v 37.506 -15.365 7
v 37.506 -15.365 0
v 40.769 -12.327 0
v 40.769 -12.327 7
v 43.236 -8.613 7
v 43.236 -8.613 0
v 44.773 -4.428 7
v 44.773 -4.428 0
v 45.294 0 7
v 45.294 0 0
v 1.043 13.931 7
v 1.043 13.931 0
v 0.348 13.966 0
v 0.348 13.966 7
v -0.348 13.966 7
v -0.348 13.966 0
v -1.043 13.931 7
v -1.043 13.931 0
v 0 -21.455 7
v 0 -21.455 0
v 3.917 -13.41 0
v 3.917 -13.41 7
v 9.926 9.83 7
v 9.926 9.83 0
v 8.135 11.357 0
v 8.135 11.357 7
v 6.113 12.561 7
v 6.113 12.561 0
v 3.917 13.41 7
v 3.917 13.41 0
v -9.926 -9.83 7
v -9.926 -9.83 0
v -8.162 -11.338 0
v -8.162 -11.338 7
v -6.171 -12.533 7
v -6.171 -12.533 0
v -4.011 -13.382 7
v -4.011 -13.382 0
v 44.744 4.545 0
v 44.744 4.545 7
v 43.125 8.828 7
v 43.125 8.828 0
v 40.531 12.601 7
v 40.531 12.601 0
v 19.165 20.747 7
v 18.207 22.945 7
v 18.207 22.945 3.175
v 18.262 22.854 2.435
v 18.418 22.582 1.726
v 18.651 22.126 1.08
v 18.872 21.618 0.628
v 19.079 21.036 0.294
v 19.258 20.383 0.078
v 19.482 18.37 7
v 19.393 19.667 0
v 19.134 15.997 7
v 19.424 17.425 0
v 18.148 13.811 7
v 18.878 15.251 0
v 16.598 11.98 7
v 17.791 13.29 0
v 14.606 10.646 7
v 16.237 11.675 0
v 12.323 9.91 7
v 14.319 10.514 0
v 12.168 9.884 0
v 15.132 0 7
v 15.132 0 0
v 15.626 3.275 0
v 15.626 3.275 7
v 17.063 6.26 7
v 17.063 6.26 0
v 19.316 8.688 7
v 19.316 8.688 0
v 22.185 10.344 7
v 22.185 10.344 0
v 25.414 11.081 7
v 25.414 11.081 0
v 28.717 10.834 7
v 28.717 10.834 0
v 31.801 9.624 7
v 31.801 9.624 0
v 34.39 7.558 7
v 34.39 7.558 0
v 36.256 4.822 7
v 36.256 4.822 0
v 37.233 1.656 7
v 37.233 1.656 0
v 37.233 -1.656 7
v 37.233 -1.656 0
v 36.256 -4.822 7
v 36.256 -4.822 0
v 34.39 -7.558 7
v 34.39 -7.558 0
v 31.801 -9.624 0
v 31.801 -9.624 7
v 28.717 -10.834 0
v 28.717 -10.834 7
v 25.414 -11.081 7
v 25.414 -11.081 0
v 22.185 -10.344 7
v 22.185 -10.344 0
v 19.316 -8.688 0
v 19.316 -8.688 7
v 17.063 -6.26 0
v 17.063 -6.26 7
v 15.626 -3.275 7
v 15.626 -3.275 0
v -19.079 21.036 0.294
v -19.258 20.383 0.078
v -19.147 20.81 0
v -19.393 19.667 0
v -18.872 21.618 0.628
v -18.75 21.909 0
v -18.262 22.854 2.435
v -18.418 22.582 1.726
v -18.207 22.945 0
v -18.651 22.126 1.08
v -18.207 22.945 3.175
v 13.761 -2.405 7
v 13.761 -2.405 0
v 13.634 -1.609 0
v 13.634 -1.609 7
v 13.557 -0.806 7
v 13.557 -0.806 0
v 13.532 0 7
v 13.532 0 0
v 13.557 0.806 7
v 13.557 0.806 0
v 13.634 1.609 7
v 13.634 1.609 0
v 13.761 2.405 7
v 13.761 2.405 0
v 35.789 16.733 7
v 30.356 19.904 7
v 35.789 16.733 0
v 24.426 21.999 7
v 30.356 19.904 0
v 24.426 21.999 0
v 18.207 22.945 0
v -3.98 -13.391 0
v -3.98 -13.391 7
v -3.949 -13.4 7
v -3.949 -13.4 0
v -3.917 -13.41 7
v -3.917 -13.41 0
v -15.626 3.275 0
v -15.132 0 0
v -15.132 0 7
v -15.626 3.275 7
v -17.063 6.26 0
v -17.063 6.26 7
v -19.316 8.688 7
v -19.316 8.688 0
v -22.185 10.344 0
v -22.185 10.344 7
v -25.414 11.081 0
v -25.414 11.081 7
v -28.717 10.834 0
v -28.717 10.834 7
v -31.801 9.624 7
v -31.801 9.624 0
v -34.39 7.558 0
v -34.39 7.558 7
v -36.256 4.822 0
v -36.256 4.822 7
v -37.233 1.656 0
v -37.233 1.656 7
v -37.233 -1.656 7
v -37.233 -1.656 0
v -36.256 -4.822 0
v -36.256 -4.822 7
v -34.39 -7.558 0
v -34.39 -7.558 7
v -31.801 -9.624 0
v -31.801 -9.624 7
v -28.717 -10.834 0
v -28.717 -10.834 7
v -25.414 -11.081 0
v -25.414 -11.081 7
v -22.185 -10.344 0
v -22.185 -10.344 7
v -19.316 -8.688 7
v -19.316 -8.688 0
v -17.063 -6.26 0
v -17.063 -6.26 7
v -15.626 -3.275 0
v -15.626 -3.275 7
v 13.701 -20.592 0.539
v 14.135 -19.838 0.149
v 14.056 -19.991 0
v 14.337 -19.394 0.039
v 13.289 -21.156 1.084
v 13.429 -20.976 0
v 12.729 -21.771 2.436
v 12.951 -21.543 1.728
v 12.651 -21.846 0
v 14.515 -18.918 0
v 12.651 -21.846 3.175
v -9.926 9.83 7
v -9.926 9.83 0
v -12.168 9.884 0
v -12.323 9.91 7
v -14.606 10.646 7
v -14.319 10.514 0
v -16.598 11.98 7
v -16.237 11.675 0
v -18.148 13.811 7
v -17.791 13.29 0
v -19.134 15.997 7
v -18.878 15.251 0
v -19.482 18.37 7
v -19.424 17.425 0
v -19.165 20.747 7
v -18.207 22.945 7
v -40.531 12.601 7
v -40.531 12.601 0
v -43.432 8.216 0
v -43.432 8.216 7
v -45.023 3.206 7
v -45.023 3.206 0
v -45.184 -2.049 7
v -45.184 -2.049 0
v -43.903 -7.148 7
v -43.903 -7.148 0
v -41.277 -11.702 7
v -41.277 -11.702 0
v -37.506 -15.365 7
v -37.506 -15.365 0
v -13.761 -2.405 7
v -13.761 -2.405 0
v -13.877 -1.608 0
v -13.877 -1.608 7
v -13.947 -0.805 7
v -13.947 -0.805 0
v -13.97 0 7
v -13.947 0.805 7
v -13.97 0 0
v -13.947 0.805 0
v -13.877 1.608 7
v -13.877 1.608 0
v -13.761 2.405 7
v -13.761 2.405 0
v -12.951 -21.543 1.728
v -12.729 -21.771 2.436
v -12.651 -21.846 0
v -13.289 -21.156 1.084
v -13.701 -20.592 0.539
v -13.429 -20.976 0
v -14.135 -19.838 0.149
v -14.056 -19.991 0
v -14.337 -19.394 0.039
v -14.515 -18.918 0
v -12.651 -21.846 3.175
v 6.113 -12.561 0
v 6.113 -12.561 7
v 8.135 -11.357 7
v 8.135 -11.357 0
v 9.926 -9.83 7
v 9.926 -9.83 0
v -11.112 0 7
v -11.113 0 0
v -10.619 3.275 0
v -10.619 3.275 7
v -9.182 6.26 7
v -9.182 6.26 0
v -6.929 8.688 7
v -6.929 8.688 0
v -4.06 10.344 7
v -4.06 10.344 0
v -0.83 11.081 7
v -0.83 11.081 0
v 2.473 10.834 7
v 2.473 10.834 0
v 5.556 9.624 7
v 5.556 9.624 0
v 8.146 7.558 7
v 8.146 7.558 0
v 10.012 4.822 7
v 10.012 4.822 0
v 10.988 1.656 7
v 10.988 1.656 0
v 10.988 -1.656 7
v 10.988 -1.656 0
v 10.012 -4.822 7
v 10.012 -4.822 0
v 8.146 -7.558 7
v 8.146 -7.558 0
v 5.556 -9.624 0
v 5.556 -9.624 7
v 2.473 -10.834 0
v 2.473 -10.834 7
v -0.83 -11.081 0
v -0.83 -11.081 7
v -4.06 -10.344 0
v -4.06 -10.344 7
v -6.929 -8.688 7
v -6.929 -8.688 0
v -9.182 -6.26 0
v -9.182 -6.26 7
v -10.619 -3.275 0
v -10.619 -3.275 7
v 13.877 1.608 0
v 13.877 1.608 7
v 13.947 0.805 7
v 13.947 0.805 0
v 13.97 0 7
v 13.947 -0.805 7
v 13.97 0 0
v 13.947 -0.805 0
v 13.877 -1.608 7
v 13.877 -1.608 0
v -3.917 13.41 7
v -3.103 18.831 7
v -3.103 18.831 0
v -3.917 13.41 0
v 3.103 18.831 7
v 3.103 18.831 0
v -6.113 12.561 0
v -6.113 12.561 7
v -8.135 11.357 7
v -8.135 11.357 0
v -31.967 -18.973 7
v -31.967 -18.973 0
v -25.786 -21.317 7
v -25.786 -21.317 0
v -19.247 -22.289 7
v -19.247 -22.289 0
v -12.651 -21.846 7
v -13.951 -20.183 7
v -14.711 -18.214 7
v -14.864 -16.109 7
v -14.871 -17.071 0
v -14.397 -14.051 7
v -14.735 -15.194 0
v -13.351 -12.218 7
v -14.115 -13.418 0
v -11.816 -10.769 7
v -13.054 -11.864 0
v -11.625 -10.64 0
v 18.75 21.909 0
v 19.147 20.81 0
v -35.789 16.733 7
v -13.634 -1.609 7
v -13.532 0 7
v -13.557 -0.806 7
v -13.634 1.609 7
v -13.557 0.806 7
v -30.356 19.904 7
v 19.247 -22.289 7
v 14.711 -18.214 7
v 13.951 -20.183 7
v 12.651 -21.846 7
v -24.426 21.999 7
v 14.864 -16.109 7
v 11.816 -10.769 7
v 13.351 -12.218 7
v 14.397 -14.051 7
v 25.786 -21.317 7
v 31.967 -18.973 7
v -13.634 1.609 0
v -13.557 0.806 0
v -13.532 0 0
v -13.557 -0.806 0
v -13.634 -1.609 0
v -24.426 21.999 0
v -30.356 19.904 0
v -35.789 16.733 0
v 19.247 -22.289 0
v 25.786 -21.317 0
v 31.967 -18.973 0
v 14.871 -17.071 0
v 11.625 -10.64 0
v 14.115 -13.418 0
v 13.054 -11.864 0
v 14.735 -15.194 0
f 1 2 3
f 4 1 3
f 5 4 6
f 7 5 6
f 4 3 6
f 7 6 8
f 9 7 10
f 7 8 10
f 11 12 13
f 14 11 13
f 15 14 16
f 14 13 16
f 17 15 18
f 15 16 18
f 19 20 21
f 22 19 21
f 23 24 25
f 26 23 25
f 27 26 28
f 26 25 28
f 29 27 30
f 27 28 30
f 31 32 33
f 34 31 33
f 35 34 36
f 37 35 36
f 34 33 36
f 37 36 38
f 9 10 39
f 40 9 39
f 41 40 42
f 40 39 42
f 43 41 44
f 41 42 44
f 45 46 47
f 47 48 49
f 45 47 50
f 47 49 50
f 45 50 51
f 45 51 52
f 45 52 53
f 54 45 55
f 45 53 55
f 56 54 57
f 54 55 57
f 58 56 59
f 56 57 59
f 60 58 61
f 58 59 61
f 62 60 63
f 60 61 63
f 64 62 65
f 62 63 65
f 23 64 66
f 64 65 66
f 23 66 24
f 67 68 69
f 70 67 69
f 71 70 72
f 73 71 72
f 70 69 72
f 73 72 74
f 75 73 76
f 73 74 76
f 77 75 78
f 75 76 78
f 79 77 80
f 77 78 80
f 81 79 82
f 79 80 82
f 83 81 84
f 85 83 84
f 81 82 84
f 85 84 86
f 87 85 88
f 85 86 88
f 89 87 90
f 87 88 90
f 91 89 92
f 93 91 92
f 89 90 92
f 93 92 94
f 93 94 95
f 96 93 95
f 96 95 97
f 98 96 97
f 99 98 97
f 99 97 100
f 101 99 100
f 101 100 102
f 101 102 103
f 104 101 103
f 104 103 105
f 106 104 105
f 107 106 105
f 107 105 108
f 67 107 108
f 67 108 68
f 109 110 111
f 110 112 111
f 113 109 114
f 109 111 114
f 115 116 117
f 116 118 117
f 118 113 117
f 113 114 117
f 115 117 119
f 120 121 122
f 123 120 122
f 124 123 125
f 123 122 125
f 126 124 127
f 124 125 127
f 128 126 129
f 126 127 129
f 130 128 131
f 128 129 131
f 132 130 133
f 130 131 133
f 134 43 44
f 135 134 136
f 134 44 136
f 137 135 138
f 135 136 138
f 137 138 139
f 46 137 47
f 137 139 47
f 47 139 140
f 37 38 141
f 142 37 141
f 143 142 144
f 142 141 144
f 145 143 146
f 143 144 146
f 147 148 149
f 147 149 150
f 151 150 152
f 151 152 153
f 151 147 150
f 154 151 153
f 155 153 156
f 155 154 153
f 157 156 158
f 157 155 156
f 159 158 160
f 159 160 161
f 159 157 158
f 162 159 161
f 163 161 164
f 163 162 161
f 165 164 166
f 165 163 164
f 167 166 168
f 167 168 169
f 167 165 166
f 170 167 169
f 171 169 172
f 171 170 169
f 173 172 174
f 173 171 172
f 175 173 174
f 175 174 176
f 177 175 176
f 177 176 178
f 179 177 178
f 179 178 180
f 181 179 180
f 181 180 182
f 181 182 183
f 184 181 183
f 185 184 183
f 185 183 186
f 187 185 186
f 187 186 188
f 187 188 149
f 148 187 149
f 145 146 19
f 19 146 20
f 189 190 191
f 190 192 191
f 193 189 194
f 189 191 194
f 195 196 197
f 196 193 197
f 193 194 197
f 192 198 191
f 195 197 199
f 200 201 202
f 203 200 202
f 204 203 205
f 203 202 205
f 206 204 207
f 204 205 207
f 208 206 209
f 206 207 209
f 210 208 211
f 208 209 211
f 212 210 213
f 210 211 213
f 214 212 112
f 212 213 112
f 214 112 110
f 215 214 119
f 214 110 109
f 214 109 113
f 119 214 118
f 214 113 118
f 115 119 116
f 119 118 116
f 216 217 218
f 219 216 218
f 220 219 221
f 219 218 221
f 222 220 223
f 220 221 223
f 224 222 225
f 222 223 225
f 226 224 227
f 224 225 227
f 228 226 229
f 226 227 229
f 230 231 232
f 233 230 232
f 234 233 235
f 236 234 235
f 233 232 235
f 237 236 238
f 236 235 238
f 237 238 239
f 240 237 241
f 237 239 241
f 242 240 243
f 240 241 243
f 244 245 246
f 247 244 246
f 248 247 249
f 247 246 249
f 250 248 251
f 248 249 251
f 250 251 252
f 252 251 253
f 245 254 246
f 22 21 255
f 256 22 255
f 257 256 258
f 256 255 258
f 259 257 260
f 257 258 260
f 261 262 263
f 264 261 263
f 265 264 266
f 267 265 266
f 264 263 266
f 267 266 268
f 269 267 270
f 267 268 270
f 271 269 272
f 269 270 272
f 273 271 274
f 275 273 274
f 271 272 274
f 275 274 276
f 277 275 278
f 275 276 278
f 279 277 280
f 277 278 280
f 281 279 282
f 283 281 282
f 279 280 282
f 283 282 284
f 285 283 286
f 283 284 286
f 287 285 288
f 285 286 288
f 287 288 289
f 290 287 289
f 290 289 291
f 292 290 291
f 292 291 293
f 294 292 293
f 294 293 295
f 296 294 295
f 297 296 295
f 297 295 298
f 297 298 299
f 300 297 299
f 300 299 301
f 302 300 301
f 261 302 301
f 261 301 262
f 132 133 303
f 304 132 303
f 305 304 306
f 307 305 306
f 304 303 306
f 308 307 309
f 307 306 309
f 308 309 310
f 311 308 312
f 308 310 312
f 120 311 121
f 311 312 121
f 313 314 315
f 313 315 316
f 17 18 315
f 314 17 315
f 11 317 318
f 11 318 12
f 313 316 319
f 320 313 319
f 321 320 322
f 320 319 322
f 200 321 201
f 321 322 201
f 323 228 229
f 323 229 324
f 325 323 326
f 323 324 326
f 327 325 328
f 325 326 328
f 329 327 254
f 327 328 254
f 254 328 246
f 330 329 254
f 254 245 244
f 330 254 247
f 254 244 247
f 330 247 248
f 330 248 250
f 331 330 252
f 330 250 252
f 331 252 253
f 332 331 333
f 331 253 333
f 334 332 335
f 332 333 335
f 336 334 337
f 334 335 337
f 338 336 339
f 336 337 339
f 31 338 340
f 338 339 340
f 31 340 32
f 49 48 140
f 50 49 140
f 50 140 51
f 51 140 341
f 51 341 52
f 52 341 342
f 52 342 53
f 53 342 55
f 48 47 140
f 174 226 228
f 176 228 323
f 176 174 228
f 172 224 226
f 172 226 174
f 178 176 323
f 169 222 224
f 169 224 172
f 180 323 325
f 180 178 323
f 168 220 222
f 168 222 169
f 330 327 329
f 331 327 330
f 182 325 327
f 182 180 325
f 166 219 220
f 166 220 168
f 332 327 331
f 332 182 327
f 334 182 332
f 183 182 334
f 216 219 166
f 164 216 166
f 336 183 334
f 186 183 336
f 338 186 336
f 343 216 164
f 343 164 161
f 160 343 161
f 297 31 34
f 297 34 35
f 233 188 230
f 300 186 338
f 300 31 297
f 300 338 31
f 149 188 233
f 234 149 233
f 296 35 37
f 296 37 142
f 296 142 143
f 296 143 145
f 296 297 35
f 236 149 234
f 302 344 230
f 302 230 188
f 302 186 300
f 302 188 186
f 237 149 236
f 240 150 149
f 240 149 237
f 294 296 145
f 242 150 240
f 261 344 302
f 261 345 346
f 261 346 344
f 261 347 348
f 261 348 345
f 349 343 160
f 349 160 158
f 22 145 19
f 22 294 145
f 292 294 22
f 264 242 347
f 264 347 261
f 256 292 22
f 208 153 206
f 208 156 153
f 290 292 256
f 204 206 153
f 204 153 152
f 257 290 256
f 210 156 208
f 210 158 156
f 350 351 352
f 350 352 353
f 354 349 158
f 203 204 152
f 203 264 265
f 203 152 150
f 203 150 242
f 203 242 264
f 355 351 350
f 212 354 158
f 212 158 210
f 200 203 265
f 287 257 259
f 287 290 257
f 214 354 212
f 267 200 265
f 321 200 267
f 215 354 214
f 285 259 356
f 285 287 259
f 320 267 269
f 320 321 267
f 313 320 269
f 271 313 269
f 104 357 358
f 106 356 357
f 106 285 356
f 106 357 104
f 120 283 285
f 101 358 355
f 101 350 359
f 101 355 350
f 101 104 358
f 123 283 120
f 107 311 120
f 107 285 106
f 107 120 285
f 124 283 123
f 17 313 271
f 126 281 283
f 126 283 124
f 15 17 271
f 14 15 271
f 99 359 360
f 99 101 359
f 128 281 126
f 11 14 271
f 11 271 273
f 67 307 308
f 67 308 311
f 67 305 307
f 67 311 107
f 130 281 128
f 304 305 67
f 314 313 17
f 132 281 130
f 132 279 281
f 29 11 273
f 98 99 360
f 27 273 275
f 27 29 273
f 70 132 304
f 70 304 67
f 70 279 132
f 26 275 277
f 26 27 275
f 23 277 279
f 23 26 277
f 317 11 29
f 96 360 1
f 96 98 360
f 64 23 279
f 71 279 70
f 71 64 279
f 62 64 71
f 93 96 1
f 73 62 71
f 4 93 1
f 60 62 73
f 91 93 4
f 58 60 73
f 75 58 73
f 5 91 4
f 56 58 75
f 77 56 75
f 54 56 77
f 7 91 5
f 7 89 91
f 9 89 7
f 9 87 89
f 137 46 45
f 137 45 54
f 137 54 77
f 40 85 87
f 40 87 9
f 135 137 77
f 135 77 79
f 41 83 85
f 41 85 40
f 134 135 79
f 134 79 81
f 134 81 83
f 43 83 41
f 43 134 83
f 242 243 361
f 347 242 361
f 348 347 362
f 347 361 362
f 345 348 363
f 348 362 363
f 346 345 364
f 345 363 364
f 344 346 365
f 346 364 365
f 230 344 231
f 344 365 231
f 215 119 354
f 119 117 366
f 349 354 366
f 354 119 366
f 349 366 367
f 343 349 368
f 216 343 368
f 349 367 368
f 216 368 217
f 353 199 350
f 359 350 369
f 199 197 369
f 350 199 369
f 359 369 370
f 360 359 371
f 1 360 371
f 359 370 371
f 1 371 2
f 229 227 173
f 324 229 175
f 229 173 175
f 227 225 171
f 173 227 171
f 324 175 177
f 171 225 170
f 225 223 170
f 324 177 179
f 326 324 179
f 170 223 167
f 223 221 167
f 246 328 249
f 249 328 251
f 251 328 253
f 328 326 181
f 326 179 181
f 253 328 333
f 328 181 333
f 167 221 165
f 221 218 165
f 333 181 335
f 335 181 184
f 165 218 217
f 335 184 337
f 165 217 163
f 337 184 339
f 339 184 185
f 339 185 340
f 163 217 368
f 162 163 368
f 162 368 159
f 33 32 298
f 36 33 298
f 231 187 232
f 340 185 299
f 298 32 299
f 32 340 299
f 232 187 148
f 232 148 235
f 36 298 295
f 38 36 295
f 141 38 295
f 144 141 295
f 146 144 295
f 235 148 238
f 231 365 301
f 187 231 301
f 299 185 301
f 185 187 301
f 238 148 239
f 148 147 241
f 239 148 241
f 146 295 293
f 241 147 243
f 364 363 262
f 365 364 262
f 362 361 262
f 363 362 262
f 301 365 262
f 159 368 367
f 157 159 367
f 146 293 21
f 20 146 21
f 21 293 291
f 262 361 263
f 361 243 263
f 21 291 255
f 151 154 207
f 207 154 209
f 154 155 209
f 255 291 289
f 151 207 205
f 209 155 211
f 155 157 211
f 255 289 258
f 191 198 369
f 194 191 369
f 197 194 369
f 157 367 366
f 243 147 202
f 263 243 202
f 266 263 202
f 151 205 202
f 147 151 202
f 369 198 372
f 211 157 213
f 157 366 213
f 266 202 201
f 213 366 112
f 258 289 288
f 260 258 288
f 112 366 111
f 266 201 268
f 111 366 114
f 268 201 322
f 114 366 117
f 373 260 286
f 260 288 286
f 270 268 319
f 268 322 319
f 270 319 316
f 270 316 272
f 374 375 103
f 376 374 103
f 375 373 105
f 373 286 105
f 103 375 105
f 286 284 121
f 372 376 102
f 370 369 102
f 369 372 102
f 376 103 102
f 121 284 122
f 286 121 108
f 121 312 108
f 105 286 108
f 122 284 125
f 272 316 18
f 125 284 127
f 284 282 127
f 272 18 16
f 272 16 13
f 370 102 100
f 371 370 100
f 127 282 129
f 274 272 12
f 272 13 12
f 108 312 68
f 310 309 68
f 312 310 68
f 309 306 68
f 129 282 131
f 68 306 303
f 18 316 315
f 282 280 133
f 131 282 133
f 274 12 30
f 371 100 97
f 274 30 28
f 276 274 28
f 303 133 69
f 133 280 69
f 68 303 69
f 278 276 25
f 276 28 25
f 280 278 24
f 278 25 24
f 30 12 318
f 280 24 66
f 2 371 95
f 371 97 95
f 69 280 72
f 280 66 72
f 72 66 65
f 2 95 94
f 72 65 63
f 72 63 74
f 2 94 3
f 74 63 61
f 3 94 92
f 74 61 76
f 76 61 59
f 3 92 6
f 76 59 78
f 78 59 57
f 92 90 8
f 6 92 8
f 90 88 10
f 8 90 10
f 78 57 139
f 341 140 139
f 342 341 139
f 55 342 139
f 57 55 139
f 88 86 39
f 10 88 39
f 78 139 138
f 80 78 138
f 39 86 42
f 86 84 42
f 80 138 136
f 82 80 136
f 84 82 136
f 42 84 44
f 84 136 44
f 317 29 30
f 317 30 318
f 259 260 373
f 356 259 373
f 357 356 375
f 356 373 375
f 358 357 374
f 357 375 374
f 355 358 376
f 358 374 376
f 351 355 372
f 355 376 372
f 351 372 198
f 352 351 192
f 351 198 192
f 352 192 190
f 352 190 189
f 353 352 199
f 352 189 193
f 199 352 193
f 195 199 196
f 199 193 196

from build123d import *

# Parameters (mm, degrees)
F0_R     = 11.1125
F1_DEPTH = 6.35
F2_R     = 3.17499
F3_DEPTH = 7


# Not quite as in the source:
# - a fillet or chamfer is up to 0.001 mm smaller than in the source, because OpenCascade refuses the exact size


with BuildPart() as f1:
    # F0 (on Top) → F1 (new body)
    with BuildSketch(Plane.XY):
        with BuildLine():
            ThreePointArc((-9.9264482926, -9.8298791597), (-7.1913775024, -11.9768522417), (-4.010805007, -13.3818662075))
            ThreePointArc((-4.010805007, -13.3818662075), (-3.9641218469, -13.3957694062), (-3.9173904939, -13.4095097494))
            ThreePointArc((-3.9173904939, -13.4095097494), (0, -13.97), (3.9173904939, -13.4095097494))
            ThreePointArc((3.9173904939, -13.4095097494), (7.1495738947, -12.001853737), (9.9264482926, -9.8298791597))
            ThreePointArc((9.9264482926, -9.8298791597), (12.4120380065, -6.4111007266), (13.7613551332, -2.4054115859))
            ThreePointArc((13.7613551332, -2.4054115859), (13.5892538356, -1.2081742794), (13.5317131076, 0))
            Line((13.5317131076, 0), (11.1125, 0))
            ThreePointArc((11.1125, 0), (0, -11.1125), (-11.1125, 0))
            Line((-11.1125, 0), (-13.5317149703, 0))
            ThreePointArc((-13.5317149703, 0), (-13.589255453, -1.2081717101), (-13.7613560192, -2.4054065173))
            ThreePointArc((-13.7613560192, -2.4054065173), (-12.4120391871, -6.4110984408), (-9.9264482926, -9.8298791597))
        make_face()
        with BuildLine():
            ThreePointArc((3.9173904939, -13.4095097494), (0, -13.97), (-3.9173904939, -13.4095097494))
            Line((-3.9173904939, -13.4095097494), (0, -21.4545894414))
            Line((0, -21.4545894414), (3.9173904939, -13.4095097494))
        make_face()
        with BuildLine():
            ThreePointArc((-12.6513041413, -21.8456521056), (-14.7063688094, -15.0627697401), (-9.9264482926, -9.8298791597))
            ThreePointArc((-9.9264482926, -9.8298791597), (-12.4120391871, -6.4110984408), (-13.7613560192, -2.4054065173))
            ThreePointArc((-13.7613560192, -2.4054065173), (-13.9177412605, -1.2072192038), (-13.97, 0))
            ThreePointArc((-13.97, 0), (-13.9177412605, 1.2072192038), (-13.7613560192, 2.4054065173))
            ThreePointArc((-13.7613560192, 2.4054065173), (-12.4120395648, 6.4110977096), (-9.9264494507, 9.8298779902))
            ThreePointArc((-9.9264494507, 9.8298779902), (-18.1475057056, 13.8110021796), (-18.2071019663, 22.9450902043))
            ThreePointArc((-18.2071019663, 22.9450902043), (-30.3564318276, 19.9035068059), (-40.5314124536, 12.6009582845))
            ThreePointArc((-40.5314124536, 12.6009582845), (-45.1838875342, -2.0490994228), (-37.5057111895, -15.3650794177))
            ThreePointArc((-37.5057111895, -15.3650794177), (-25.7855371398, -21.3169777129), (-12.6513041413, -21.8456521056))
        make_face()
        with Locations((-26.2444149703, 0)):
            Circle(F0_R, mode=Mode.SUBTRACT)
        with BuildLine():
            ThreePointArc((13.7613551332, -2.4054115859), (12.4120380065, -6.4111007266), (9.9264482926, -9.8298791597))
            ThreePointArc((9.9264482926, -9.8298791597), (14.7063688094, -15.0627697401), (12.6513041413, -21.8456521056))
            ThreePointArc((12.6513041413, -21.8456521056), (25.7855371398, -21.3169777129), (37.5057111895, -15.3650794177))
            ThreePointArc((37.5057111895, -15.3650794177), (43.2360320484, -8.6132099574), (45.2944131076, 0))
            Line((45.2944131076, 0), (37.3569131076, 0))
            ThreePointArc((37.3569131076, 0), (26.2444131076, -11.1125), (15.1319131076, 0))
            Line((15.1319131076, 0), (13.97, 0))
            ThreePointArc((13.97, 0), (13.9177410382, -1.2072217669), (13.7613551332, -2.4054115859))
        make_face()
        with BuildLine():
            ThreePointArc((-13.7613560192, 2.4054065173), (-13.589255453, 1.2081717101), (-13.5317149703, 0))
            Line((-13.5317149703, 0), (-11.1125, 0))
            ThreePointArc((-11.1125, 0), (0, 11.1125), (11.1125, 0))
            Line((11.1125, 0), (13.5317131076, 0))
            ThreePointArc((13.5317131076, 0), (13.5892538356, 1.2081742794), (13.7613551332, 2.4054115859))
            ThreePointArc((13.7613551332, 2.4054115859), (12.4120383841, 6.4110999954), (9.9264494507, 9.8298779902))
            ThreePointArc((9.9264494507, 9.8298779902), (7.1495746018, 12.0018533158), (3.9173904939, 13.4095097494))
            ThreePointArc((3.9173904939, 13.4095097494), (2.4938325804, 13.7456065367), (1.0429356844, 13.9310152235))
            ThreePointArc((1.0429356844, 13.9310152235), (0, 13.97), (-1.0429356844, 13.9310152235))
            ThreePointArc((-1.0429356844, 13.9310152235), (-2.4938325804, 13.7456065367), (-3.9173904939, 13.4095097494))
            ThreePointArc((-3.9173904939, 13.4095097494), (-7.1495746018, 12.0018533158), (-9.9264494507, 9.8298779902))
            ThreePointArc((-9.9264494507, 9.8298779902), (-12.4120395648, 6.4110977096), (-13.7613560192, 2.4054065173))
        make_face()
        with BuildLine():
            ThreePointArc((13.7613551332, 2.4054115859), (13.9177410382, 1.2072217669), (13.97, 0))
            Line((13.97, 0), (15.1319131076, 0))
            ThreePointArc((15.1319131076, 0), (26.2444131076, 11.1125), (37.3569131076, 0))
            Line((37.3569131076, 0), (45.2944131076, 0))
            ThreePointArc((45.2944131076, 0), (44.0639226062, 6.7355460973), (40.5314124536, 12.6009582845))
            ThreePointArc((40.5314124536, 12.6009582845), (30.3564318276, 19.9035068059), (18.2071019663, 22.9450902043))
            ThreePointArc((18.2071019663, 22.9450902043), (18.1475057056, 13.8110021796), (9.9264494507, 9.8298779902))
            ThreePointArc((9.9264494507, 9.8298779902), (12.4120383841, 6.4110999954), (13.7613551332, 2.4054115859))
        make_face()
        with BuildLine():
            Line((-3.102583345, 18.8314262778), (-3.9173904939, 13.4095097494))
            ThreePointArc((-3.9173904939, 13.4095097494), (-2.4938325804, 13.7456065367), (-1.0429356844, 13.9310152235))
            Line((-1.0429356844, 13.9310152235), (-3.102583345, 18.8314262778))
        make_face()
        with BuildLine():
            ThreePointArc((1.0429356844, 13.9310152235), (2.4938325804, 13.7456065367), (3.9173904939, 13.4095097494))
            Line((3.9173904939, 13.4095097494), (3.102583345, 18.8314262778))
            Line((3.102583345, 18.8314262778), (1.0429356844, 13.9310152235))
        make_face()
    extrude(amount=F1_DEPTH)

    # F2 (radius 3.175 in the source; OpenCascade refuses exactly that, so slightly less here)
    f2_edges = [f1.edges().sort_by_distance(p)[0] for p in [
        (-45.183888, -2.049099, 6.35),
        (45.183888, -2.049099, 6.35),
        (45.183888, -2.049099, 0),
        (-45.183888, -2.049099, 0),
    ]]
    fillet(f2_edges, radius=F2_R)

    # F0 (on Top) → F3 (join)
    with BuildSketch(Plane.XY):
        with BuildLine():
            ThreePointArc((-9.9264482926, -9.8298791597), (-7.1913775024, -11.9768522417), (-4.010805007, -13.3818662075))
            ThreePointArc((-4.010805007, -13.3818662075), (-3.9641218469, -13.3957694062), (-3.9173904939, -13.4095097494))
            ThreePointArc((-3.9173904939, -13.4095097494), (0, -13.97), (3.9173904939, -13.4095097494))
            ThreePointArc((3.9173904939, -13.4095097494), (7.1495738947, -12.001853737), (9.9264482926, -9.8298791597))
            ThreePointArc((9.9264482926, -9.8298791597), (12.4120380065, -6.4111007266), (13.7613551332, -2.4054115859))
            ThreePointArc((13.7613551332, -2.4054115859), (13.5892538356, -1.2081742794), (13.5317131076, 0))
            Line((13.5317131076, 0), (11.1125, 0))
            ThreePointArc((11.1125, 0), (0, -11.1125), (-11.1125, 0))
            Line((-11.1125, 0), (-13.5317149703, 0))
            ThreePointArc((-13.5317149703, 0), (-13.589255453, -1.2081717101), (-13.7613560192, -2.4054065173))
            ThreePointArc((-13.7613560192, -2.4054065173), (-12.4120391871, -6.4110984408), (-9.9264482926, -9.8298791597))
        make_face()
        with BuildLine():
            ThreePointArc((3.9173904939, -13.4095097494), (0, -13.97), (-3.9173904939, -13.4095097494))
            Line((-3.9173904939, -13.4095097494), (0, -21.4545894414))
            Line((0, -21.4545894414), (3.9173904939, -13.4095097494))
        make_face()
        with BuildLine():
            ThreePointArc((-12.6513041413, -21.8456521056), (-14.7063688094, -15.0627697401), (-9.9264482926, -9.8298791597))
            ThreePointArc((-9.9264482926, -9.8298791597), (-12.4120391871, -6.4110984408), (-13.7613560192, -2.4054065173))
            ThreePointArc((-13.7613560192, -2.4054065173), (-13.9177412605, -1.2072192038), (-13.97, 0))
            ThreePointArc((-13.97, 0), (-13.9177412605, 1.2072192038), (-13.7613560192, 2.4054065173))
            ThreePointArc((-13.7613560192, 2.4054065173), (-12.4120395648, 6.4110977096), (-9.9264494507, 9.8298779902))
            ThreePointArc((-9.9264494507, 9.8298779902), (-18.1475057056, 13.8110021796), (-18.2071019663, 22.9450902043))
            ThreePointArc((-18.2071019663, 22.9450902043), (-30.3564318276, 19.9035068059), (-40.5314124536, 12.6009582845))
            ThreePointArc((-40.5314124536, 12.6009582845), (-45.1838875342, -2.0490994228), (-37.5057111895, -15.3650794177))
            ThreePointArc((-37.5057111895, -15.3650794177), (-25.7855371398, -21.3169777129), (-12.6513041413, -21.8456521056))
        make_face()
        with Locations((-26.2444149703, 0)):
            Circle(F0_R, mode=Mode.SUBTRACT)
        with BuildLine():
            ThreePointArc((13.7613551332, -2.4054115859), (12.4120380065, -6.4111007266), (9.9264482926, -9.8298791597))
            ThreePointArc((9.9264482926, -9.8298791597), (14.7063688094, -15.0627697401), (12.6513041413, -21.8456521056))
            ThreePointArc((12.6513041413, -21.8456521056), (25.7855371398, -21.3169777129), (37.5057111895, -15.3650794177))
            ThreePointArc((37.5057111895, -15.3650794177), (43.2360320484, -8.6132099574), (45.2944131076, 0))
            Line((45.2944131076, 0), (37.3569131076, 0))
            ThreePointArc((37.3569131076, 0), (26.2444131076, -11.1125), (15.1319131076, 0))
            Line((15.1319131076, 0), (13.97, 0))
            ThreePointArc((13.97, 0), (13.9177410382, -1.2072217669), (13.7613551332, -2.4054115859))
        make_face()
        with BuildLine():
            ThreePointArc((-13.7613560192, 2.4054065173), (-13.589255453, 1.2081717101), (-13.5317149703, 0))
            Line((-13.5317149703, 0), (-11.1125, 0))
            ThreePointArc((-11.1125, 0), (0, 11.1125), (11.1125, 0))
            Line((11.1125, 0), (13.5317131076, 0))
            ThreePointArc((13.5317131076, 0), (13.5892538356, 1.2081742794), (13.7613551332, 2.4054115859))
            ThreePointArc((13.7613551332, 2.4054115859), (12.4120383841, 6.4110999954), (9.9264494507, 9.8298779902))
            ThreePointArc((9.9264494507, 9.8298779902), (7.1495746018, 12.0018533158), (3.9173904939, 13.4095097494))
            ThreePointArc((3.9173904939, 13.4095097494), (2.4938325804, 13.7456065367), (1.0429356844, 13.9310152235))
            ThreePointArc((1.0429356844, 13.9310152235), (0, 13.97), (-1.0429356844, 13.9310152235))
            ThreePointArc((-1.0429356844, 13.9310152235), (-2.4938325804, 13.7456065367), (-3.9173904939, 13.4095097494))
            ThreePointArc((-3.9173904939, 13.4095097494), (-7.1495746018, 12.0018533158), (-9.9264494507, 9.8298779902))
            ThreePointArc((-9.9264494507, 9.8298779902), (-12.4120395648, 6.4110977096), (-13.7613560192, 2.4054065173))
        make_face()
        with BuildLine():
            ThreePointArc((13.7613551332, 2.4054115859), (13.9177410382, 1.2072217669), (13.97, 0))
            Line((13.97, 0), (15.1319131076, 0))
            ThreePointArc((15.1319131076, 0), (26.2444131076, 11.1125), (37.3569131076, 0))
            Line((37.3569131076, 0), (45.2944131076, 0))
            ThreePointArc((45.2944131076, 0), (44.0639226062, 6.7355460973), (40.5314124536, 12.6009582845))
            ThreePointArc((40.5314124536, 12.6009582845), (30.3564318276, 19.9035068059), (18.2071019663, 22.9450902043))
            ThreePointArc((18.2071019663, 22.9450902043), (18.1475057056, 13.8110021796), (9.9264494507, 9.8298779902))
            ThreePointArc((9.9264494507, 9.8298779902), (12.4120383841, 6.4110999954), (13.7613551332, 2.4054115859))
        make_face()
        with BuildLine():
            Line((-3.102583345, 18.8314262778), (-3.9173904939, 13.4095097494))
            ThreePointArc((-3.9173904939, 13.4095097494), (-2.4938325804, 13.7456065367), (-1.0429356844, 13.9310152235))
            Line((-1.0429356844, 13.9310152235), (-3.102583345, 18.8314262778))
        make_face()
        with BuildLine():
            ThreePointArc((1.0429356844, 13.9310152235), (2.4938325804, 13.7456065367), (3.9173904939, 13.4095097494))
            Line((3.9173904939, 13.4095097494), (3.102583345, 18.8314262778))
            Line((3.102583345, 18.8314262778), (1.0429356844, 13.9310152235))
        make_face()
    extrude(amount=F3_DEPTH)


solid = f1.part
